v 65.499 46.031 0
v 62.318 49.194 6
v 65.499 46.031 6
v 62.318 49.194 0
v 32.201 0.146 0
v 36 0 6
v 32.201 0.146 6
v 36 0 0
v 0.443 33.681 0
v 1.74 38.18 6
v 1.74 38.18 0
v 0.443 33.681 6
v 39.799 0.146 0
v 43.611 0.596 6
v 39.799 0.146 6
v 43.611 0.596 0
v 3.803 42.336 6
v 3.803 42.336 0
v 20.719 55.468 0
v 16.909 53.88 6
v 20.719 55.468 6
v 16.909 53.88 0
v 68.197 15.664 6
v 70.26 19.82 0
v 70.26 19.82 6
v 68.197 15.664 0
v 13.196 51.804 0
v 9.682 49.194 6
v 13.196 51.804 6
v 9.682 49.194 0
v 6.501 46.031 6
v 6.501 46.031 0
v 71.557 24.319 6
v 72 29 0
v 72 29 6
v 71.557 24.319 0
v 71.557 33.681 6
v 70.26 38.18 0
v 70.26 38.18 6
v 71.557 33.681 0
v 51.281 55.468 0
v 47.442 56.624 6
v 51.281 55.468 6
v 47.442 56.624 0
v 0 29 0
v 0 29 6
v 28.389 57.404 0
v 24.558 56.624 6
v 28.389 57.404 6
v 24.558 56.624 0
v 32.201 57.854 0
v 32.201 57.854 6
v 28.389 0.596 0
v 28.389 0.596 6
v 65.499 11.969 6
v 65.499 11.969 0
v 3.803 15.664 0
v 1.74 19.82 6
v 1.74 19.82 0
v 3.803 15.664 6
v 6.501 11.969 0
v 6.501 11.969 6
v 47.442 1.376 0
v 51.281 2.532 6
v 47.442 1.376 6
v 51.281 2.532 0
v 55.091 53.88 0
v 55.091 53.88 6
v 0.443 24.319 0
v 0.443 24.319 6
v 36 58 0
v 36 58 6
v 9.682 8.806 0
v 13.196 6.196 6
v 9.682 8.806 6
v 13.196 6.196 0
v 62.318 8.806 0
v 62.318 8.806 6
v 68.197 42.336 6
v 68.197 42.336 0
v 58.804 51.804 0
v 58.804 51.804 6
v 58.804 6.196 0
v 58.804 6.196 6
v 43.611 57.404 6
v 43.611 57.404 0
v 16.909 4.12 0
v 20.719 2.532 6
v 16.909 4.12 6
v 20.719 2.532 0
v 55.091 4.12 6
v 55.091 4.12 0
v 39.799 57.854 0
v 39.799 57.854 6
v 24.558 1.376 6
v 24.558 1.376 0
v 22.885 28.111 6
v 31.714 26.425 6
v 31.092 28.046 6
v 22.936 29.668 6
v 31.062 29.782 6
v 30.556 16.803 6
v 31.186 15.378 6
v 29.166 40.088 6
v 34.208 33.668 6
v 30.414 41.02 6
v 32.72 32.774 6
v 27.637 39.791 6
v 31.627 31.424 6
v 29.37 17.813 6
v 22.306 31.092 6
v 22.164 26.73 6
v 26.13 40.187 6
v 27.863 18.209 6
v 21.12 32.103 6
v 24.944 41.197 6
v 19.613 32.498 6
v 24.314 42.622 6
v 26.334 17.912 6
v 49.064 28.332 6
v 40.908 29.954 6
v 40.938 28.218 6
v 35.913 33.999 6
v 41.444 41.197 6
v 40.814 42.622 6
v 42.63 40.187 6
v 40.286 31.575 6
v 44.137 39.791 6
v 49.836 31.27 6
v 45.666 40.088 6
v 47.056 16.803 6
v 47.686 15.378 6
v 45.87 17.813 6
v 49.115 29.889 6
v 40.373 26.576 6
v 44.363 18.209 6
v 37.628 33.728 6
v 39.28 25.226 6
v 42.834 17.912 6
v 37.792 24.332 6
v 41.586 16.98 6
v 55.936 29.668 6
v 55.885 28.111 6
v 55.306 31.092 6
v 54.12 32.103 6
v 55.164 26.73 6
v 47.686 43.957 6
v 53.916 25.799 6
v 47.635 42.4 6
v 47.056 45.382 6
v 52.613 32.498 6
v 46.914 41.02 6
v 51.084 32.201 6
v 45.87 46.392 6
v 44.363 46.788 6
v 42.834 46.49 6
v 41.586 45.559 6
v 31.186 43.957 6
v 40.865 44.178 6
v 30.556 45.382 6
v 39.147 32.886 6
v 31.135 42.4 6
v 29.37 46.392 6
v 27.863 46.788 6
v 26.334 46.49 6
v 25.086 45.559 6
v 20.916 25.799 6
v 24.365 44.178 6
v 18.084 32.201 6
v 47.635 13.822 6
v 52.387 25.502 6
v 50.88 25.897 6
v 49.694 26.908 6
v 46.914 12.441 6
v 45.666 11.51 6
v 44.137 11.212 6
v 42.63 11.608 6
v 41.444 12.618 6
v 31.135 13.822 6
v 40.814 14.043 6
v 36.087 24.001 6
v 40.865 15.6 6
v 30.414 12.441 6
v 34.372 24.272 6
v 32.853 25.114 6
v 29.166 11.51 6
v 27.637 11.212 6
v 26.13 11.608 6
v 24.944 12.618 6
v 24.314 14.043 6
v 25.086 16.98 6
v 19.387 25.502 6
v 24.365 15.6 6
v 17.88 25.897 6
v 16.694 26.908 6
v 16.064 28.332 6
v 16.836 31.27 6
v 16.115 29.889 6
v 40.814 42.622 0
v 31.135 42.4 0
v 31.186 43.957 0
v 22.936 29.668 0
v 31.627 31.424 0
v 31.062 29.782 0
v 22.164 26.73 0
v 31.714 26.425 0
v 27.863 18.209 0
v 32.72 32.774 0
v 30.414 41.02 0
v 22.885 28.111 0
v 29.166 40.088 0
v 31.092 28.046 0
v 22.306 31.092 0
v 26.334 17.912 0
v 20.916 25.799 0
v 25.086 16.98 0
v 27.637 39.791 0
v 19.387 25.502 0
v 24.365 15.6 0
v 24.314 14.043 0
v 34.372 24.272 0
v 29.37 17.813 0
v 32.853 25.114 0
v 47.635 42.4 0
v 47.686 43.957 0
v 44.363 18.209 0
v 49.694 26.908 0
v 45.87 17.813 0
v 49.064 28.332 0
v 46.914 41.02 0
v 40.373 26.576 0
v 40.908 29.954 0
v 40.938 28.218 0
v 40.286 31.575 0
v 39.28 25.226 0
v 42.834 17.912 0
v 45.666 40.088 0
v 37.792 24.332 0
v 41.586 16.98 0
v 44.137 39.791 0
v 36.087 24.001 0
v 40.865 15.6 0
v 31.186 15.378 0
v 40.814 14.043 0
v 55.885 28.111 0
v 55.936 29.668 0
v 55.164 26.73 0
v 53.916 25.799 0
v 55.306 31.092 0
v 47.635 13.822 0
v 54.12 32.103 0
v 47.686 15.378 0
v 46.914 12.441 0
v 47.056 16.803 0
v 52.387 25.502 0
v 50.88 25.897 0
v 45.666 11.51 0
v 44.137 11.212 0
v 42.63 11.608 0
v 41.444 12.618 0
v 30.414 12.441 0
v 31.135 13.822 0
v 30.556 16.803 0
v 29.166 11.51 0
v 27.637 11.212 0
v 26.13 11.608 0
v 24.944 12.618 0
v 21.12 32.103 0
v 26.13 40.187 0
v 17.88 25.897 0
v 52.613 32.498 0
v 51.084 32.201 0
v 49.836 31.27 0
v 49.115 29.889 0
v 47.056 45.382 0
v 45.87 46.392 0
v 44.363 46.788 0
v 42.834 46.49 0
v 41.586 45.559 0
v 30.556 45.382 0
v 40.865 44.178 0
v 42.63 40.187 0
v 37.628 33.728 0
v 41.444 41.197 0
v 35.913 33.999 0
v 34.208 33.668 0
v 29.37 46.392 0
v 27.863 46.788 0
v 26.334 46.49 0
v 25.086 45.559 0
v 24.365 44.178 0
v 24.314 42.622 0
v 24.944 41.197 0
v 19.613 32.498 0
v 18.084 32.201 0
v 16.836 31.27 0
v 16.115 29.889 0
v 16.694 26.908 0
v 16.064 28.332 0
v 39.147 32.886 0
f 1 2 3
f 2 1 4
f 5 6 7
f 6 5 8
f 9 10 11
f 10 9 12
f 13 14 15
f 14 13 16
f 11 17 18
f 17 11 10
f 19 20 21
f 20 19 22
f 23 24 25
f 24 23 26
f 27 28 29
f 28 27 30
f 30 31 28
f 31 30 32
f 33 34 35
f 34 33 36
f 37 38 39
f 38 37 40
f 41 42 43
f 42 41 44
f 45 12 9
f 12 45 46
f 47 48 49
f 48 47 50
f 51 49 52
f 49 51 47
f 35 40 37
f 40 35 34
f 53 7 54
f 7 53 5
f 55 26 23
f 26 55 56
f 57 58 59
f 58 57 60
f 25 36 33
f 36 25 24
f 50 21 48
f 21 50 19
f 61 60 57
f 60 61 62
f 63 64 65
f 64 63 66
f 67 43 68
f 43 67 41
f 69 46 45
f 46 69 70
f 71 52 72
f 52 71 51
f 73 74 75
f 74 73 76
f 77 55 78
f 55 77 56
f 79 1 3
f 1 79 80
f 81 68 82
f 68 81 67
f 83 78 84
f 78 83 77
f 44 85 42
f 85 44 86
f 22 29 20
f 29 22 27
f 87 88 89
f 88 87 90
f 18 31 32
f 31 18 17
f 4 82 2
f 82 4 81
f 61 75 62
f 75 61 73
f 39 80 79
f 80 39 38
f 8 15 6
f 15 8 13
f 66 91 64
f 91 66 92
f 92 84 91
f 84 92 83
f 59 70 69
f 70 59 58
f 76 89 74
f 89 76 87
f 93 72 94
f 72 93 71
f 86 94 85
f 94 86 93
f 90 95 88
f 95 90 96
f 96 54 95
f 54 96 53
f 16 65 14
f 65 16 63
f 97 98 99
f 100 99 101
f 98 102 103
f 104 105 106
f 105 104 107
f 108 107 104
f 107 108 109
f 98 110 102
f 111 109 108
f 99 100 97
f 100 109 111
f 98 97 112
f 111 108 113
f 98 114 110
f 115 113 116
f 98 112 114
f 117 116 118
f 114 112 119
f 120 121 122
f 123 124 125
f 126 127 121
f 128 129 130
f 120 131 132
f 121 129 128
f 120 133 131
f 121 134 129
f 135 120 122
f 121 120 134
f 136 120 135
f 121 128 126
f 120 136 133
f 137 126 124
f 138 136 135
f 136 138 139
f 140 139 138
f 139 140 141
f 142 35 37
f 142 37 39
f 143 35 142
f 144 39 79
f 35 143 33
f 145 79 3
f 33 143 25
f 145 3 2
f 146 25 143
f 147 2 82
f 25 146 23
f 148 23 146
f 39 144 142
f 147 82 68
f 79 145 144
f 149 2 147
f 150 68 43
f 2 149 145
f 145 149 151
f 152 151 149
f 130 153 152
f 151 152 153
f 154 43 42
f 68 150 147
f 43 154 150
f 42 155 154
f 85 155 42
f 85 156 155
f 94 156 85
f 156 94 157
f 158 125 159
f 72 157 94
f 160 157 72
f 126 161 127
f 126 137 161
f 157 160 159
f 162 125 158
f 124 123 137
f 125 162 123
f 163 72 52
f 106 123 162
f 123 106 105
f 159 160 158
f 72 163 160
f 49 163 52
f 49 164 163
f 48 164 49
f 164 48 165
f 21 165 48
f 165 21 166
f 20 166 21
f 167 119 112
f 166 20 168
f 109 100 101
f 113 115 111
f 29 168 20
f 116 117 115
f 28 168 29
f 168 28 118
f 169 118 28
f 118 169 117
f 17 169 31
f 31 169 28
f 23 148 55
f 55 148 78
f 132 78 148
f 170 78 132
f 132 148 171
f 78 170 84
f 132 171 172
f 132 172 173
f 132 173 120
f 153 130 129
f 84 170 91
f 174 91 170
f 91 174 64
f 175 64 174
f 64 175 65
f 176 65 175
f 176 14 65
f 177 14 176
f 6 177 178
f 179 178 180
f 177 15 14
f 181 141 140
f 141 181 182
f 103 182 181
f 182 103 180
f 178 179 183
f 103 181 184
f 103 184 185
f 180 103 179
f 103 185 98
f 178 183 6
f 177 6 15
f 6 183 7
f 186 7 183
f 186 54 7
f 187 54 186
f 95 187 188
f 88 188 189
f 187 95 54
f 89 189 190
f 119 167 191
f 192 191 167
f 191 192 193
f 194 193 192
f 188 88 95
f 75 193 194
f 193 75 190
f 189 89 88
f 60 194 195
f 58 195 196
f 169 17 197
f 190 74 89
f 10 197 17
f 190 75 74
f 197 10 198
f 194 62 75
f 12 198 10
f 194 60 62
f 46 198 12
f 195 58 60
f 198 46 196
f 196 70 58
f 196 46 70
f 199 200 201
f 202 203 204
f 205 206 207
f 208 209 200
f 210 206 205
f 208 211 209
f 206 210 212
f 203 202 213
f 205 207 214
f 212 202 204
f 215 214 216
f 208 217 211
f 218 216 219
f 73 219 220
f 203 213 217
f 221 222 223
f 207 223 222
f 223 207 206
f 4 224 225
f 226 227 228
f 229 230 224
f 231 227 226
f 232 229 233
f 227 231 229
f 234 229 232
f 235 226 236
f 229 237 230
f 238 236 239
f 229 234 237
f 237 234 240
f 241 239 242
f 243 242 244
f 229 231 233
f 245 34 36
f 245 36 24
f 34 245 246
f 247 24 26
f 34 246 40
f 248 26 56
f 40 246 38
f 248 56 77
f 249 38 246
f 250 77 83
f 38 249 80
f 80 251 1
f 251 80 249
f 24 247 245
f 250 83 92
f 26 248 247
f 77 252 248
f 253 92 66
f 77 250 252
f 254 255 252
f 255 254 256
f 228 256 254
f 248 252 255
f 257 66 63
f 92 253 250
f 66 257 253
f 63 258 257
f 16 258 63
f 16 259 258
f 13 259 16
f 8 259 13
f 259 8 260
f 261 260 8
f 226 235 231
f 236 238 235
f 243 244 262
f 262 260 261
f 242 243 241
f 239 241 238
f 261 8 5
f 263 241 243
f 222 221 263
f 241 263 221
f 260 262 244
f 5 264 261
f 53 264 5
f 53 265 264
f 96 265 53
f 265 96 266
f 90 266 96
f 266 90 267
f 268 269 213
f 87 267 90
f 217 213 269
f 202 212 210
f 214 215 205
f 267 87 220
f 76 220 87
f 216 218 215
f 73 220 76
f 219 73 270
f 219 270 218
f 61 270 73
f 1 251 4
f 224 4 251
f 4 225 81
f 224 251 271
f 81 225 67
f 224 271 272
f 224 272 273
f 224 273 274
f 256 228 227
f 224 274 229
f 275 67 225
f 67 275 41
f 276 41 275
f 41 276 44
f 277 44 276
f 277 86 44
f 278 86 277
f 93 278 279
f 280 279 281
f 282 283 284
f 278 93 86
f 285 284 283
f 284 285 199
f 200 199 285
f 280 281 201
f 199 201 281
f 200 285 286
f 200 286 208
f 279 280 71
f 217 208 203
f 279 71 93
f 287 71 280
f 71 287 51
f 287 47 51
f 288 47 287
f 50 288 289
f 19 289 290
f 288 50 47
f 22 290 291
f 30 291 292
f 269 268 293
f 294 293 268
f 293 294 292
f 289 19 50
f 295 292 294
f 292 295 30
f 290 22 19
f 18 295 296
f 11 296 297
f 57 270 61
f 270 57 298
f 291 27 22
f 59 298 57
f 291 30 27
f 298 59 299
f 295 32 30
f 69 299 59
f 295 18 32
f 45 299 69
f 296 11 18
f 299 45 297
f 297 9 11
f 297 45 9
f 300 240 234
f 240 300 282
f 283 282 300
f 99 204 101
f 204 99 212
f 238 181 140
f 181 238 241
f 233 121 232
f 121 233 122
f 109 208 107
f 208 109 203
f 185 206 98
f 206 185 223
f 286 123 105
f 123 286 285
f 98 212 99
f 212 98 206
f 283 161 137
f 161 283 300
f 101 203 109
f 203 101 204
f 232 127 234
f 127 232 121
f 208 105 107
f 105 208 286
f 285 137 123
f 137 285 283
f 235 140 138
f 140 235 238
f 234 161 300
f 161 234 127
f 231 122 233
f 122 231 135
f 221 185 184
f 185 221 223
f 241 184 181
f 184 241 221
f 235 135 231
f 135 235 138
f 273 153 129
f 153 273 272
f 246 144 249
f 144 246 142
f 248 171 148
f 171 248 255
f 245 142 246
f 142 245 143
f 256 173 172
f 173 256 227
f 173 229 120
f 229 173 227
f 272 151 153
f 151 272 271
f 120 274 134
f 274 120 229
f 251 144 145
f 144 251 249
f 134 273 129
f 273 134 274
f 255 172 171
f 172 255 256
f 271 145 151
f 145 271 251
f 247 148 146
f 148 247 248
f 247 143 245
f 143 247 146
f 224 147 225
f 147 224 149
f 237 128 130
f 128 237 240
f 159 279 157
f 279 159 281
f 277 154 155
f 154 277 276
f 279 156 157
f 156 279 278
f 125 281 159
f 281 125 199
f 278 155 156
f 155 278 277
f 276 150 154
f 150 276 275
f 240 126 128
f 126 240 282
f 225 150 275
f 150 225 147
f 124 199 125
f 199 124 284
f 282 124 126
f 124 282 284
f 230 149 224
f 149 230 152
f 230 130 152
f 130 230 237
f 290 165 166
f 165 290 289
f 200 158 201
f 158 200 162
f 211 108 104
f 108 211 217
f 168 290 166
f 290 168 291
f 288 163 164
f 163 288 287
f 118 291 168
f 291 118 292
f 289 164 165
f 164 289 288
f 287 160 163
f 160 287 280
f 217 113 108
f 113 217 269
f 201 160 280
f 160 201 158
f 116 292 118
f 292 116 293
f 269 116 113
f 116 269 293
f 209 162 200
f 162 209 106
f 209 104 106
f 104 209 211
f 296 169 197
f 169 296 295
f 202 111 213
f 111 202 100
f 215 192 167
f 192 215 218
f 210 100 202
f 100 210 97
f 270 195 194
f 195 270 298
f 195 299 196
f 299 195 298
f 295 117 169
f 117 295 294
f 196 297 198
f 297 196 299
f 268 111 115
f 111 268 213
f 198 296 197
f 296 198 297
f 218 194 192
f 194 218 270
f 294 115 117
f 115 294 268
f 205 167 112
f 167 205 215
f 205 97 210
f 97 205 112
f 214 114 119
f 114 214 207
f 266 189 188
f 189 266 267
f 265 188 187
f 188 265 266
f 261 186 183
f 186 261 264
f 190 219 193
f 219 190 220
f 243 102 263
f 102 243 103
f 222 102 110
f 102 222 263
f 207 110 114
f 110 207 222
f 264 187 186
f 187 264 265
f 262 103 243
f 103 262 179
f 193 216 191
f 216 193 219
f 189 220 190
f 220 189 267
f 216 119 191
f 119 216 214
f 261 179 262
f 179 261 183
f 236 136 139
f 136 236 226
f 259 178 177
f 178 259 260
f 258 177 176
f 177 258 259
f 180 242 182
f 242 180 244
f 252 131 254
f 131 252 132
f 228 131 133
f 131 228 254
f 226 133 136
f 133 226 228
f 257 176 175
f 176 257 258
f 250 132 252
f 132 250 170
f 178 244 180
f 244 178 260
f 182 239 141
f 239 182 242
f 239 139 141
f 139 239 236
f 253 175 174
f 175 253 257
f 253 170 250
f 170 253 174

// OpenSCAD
$fn = 32;

// ----------------------------------------------------------------------
// Cam plate: double_lobe cam, base R28
// ----------------------------------------------------------------------

// --- parameters (mm) ---
base_r = 28;              // base circle radius
lobe_h = 8;               // cam lobe rise
bore_r = 5;               // shaft bore radius
plate_t = 6;              // plate thickness, Z (extrusion height)
ring_r = 16.5;            // lightening ring radius
bolt_r = 3.5;             // lightening hole radius

profile = [[72, 29], [71.557, 33.681], [70.26, 38.18], [68.197, 42.336], [65.499, 46.031], [62.318, 49.194], [58.804, 51.804], [55.091, 53.88], [51.281, 55.468], [47.442, 56.624], [43.611, 57.404], [39.799, 57.854], [36, 58], [32.201, 57.854], [28.389, 57.404], [24.558, 56.624], [20.719, 55.468], [16.909, 53.88], [13.196, 51.804], [9.682, 49.194], [6.501, 46.031], [3.803, 42.336], [1.74, 38.18], [0.443, 33.681], [0, 29], [0.443, 24.319], [1.74, 19.82], [3.803, 15.664], [6.501, 11.969], [9.682, 8.806], [13.196, 6.196], [16.909, 4.12], [20.719, 2.532], [24.558, 1.376], [28.389, 0.596], [32.201, 0.146], [36, 0], [39.799, 0.146], [43.611, 0.596], [47.442, 1.376], [51.281, 2.532], [55.091, 4.12], [58.804, 6.196], [62.318, 8.806], [65.499, 11.969], [68.197, 15.664], [70.26, 19.82], [71.557, 24.319]];  // primary outline, 48 points, counter clockwise
void_1 = [[40.908, 29.954], [40.286, 31.575], [39.147, 32.886], [37.628, 33.728], [35.913, 33.999], [34.208, 33.668], [32.72, 32.774], [31.627, 31.424], [31.062, 29.782], [31.092, 28.046], [31.714, 26.425], [32.853, 25.114], [34.372, 24.272], [36.087, 24.001], [37.792, 24.332], [39.28, 25.226], [40.373, 26.576], [40.938, 28.218]];  // shaft bore, 18 points
void_2 = [[55.936, 29.668], [55.306, 31.092], [54.12, 32.103], [52.613, 32.498], [51.084, 32.201], [49.836, 31.27], [49.115, 29.889], [49.064, 28.332], [49.694, 26.908], [50.88, 25.897], [52.387, 25.502], [53.916, 25.799], [55.164, 26.73], [55.885, 28.111]];  // lightening hole 1, 14 points
void_3 = [[47.686, 43.957], [47.056, 45.382], [45.87, 46.392], [44.363, 46.788], [42.834, 46.49], [41.586, 45.559], [40.865, 44.178], [40.814, 42.622], [41.444, 41.197], [42.63, 40.187], [44.137, 39.791], [45.666, 40.088], [46.914, 41.02], [47.635, 42.4]];  // lightening hole 2, 14 points
void_4 = [[31.186, 43.957], [30.556, 45.382], [29.37, 46.392], [27.863, 46.788], [26.334, 46.49], [25.086, 45.559], [24.365, 44.178], [24.314, 42.622], [24.944, 41.197], [26.13, 40.187], [27.637, 39.791], [29.166, 40.088], [30.414, 41.02], [31.135, 42.4]];  // lightening hole 3, 14 points
void_5 = [[22.936, 29.668], [22.306, 31.092], [21.12, 32.103], [19.613, 32.498], [18.084, 32.201], [16.836, 31.27], [16.115, 29.889], [16.064, 28.332], [16.694, 26.908], [17.88, 25.897], [19.387, 25.502], [20.916, 25.799], [22.164, 26.73], [22.885, 28.111]];  // lightening hole 4, 14 points
void_6 = [[31.186, 15.378], [30.556, 16.803], [29.37, 17.813], [27.863, 18.209], [26.334, 17.912], [25.086, 16.98], [24.365, 15.6], [24.314, 14.043], [24.944, 12.618], [26.13, 11.608], [27.637, 11.212], [29.166, 11.51], [30.414, 12.441], [31.135, 13.822]];  // lightening hole 5, 14 points
void_7 = [[47.686, 15.378], [47.056, 16.803], [45.87, 17.813], [44.363, 18.209], [42.834, 17.912], [41.586, 16.98], [40.865, 15.6], [40.814, 14.043], [41.444, 12.618], [42.63, 11.608], [44.137, 11.212], [45.666, 11.51], [46.914, 12.441], [47.635, 13.822]];  // lightening hole 6, 14 points

// --- the one profile operation ---
difference() {
  linear_extrude(height = plate_t) polygon(points = profile);
  translate([0, 0, -1])
    linear_extrude(height = plate_t + 2) polygon(points = void_1);
  translate([0, 0, -1])
    linear_extrude(height = plate_t + 2) polygon(points = void_2);
  translate([0, 0, -1])
    linear_extrude(height = plate_t + 2) polygon(points = void_3);
  translate([0, 0, -1])
    linear_extrude(height = plate_t + 2) polygon(points = void_4);
  translate([0, 0, -1])
    linear_extrude(height = plate_t + 2) polygon(points = void_5);
  translate([0, 0, -1])
    linear_extrude(height = plate_t + 2) polygon(points = void_6);
  translate([0, 0, -1])
    linear_extrude(height = plate_t + 2) polygon(points = void_7);
}
